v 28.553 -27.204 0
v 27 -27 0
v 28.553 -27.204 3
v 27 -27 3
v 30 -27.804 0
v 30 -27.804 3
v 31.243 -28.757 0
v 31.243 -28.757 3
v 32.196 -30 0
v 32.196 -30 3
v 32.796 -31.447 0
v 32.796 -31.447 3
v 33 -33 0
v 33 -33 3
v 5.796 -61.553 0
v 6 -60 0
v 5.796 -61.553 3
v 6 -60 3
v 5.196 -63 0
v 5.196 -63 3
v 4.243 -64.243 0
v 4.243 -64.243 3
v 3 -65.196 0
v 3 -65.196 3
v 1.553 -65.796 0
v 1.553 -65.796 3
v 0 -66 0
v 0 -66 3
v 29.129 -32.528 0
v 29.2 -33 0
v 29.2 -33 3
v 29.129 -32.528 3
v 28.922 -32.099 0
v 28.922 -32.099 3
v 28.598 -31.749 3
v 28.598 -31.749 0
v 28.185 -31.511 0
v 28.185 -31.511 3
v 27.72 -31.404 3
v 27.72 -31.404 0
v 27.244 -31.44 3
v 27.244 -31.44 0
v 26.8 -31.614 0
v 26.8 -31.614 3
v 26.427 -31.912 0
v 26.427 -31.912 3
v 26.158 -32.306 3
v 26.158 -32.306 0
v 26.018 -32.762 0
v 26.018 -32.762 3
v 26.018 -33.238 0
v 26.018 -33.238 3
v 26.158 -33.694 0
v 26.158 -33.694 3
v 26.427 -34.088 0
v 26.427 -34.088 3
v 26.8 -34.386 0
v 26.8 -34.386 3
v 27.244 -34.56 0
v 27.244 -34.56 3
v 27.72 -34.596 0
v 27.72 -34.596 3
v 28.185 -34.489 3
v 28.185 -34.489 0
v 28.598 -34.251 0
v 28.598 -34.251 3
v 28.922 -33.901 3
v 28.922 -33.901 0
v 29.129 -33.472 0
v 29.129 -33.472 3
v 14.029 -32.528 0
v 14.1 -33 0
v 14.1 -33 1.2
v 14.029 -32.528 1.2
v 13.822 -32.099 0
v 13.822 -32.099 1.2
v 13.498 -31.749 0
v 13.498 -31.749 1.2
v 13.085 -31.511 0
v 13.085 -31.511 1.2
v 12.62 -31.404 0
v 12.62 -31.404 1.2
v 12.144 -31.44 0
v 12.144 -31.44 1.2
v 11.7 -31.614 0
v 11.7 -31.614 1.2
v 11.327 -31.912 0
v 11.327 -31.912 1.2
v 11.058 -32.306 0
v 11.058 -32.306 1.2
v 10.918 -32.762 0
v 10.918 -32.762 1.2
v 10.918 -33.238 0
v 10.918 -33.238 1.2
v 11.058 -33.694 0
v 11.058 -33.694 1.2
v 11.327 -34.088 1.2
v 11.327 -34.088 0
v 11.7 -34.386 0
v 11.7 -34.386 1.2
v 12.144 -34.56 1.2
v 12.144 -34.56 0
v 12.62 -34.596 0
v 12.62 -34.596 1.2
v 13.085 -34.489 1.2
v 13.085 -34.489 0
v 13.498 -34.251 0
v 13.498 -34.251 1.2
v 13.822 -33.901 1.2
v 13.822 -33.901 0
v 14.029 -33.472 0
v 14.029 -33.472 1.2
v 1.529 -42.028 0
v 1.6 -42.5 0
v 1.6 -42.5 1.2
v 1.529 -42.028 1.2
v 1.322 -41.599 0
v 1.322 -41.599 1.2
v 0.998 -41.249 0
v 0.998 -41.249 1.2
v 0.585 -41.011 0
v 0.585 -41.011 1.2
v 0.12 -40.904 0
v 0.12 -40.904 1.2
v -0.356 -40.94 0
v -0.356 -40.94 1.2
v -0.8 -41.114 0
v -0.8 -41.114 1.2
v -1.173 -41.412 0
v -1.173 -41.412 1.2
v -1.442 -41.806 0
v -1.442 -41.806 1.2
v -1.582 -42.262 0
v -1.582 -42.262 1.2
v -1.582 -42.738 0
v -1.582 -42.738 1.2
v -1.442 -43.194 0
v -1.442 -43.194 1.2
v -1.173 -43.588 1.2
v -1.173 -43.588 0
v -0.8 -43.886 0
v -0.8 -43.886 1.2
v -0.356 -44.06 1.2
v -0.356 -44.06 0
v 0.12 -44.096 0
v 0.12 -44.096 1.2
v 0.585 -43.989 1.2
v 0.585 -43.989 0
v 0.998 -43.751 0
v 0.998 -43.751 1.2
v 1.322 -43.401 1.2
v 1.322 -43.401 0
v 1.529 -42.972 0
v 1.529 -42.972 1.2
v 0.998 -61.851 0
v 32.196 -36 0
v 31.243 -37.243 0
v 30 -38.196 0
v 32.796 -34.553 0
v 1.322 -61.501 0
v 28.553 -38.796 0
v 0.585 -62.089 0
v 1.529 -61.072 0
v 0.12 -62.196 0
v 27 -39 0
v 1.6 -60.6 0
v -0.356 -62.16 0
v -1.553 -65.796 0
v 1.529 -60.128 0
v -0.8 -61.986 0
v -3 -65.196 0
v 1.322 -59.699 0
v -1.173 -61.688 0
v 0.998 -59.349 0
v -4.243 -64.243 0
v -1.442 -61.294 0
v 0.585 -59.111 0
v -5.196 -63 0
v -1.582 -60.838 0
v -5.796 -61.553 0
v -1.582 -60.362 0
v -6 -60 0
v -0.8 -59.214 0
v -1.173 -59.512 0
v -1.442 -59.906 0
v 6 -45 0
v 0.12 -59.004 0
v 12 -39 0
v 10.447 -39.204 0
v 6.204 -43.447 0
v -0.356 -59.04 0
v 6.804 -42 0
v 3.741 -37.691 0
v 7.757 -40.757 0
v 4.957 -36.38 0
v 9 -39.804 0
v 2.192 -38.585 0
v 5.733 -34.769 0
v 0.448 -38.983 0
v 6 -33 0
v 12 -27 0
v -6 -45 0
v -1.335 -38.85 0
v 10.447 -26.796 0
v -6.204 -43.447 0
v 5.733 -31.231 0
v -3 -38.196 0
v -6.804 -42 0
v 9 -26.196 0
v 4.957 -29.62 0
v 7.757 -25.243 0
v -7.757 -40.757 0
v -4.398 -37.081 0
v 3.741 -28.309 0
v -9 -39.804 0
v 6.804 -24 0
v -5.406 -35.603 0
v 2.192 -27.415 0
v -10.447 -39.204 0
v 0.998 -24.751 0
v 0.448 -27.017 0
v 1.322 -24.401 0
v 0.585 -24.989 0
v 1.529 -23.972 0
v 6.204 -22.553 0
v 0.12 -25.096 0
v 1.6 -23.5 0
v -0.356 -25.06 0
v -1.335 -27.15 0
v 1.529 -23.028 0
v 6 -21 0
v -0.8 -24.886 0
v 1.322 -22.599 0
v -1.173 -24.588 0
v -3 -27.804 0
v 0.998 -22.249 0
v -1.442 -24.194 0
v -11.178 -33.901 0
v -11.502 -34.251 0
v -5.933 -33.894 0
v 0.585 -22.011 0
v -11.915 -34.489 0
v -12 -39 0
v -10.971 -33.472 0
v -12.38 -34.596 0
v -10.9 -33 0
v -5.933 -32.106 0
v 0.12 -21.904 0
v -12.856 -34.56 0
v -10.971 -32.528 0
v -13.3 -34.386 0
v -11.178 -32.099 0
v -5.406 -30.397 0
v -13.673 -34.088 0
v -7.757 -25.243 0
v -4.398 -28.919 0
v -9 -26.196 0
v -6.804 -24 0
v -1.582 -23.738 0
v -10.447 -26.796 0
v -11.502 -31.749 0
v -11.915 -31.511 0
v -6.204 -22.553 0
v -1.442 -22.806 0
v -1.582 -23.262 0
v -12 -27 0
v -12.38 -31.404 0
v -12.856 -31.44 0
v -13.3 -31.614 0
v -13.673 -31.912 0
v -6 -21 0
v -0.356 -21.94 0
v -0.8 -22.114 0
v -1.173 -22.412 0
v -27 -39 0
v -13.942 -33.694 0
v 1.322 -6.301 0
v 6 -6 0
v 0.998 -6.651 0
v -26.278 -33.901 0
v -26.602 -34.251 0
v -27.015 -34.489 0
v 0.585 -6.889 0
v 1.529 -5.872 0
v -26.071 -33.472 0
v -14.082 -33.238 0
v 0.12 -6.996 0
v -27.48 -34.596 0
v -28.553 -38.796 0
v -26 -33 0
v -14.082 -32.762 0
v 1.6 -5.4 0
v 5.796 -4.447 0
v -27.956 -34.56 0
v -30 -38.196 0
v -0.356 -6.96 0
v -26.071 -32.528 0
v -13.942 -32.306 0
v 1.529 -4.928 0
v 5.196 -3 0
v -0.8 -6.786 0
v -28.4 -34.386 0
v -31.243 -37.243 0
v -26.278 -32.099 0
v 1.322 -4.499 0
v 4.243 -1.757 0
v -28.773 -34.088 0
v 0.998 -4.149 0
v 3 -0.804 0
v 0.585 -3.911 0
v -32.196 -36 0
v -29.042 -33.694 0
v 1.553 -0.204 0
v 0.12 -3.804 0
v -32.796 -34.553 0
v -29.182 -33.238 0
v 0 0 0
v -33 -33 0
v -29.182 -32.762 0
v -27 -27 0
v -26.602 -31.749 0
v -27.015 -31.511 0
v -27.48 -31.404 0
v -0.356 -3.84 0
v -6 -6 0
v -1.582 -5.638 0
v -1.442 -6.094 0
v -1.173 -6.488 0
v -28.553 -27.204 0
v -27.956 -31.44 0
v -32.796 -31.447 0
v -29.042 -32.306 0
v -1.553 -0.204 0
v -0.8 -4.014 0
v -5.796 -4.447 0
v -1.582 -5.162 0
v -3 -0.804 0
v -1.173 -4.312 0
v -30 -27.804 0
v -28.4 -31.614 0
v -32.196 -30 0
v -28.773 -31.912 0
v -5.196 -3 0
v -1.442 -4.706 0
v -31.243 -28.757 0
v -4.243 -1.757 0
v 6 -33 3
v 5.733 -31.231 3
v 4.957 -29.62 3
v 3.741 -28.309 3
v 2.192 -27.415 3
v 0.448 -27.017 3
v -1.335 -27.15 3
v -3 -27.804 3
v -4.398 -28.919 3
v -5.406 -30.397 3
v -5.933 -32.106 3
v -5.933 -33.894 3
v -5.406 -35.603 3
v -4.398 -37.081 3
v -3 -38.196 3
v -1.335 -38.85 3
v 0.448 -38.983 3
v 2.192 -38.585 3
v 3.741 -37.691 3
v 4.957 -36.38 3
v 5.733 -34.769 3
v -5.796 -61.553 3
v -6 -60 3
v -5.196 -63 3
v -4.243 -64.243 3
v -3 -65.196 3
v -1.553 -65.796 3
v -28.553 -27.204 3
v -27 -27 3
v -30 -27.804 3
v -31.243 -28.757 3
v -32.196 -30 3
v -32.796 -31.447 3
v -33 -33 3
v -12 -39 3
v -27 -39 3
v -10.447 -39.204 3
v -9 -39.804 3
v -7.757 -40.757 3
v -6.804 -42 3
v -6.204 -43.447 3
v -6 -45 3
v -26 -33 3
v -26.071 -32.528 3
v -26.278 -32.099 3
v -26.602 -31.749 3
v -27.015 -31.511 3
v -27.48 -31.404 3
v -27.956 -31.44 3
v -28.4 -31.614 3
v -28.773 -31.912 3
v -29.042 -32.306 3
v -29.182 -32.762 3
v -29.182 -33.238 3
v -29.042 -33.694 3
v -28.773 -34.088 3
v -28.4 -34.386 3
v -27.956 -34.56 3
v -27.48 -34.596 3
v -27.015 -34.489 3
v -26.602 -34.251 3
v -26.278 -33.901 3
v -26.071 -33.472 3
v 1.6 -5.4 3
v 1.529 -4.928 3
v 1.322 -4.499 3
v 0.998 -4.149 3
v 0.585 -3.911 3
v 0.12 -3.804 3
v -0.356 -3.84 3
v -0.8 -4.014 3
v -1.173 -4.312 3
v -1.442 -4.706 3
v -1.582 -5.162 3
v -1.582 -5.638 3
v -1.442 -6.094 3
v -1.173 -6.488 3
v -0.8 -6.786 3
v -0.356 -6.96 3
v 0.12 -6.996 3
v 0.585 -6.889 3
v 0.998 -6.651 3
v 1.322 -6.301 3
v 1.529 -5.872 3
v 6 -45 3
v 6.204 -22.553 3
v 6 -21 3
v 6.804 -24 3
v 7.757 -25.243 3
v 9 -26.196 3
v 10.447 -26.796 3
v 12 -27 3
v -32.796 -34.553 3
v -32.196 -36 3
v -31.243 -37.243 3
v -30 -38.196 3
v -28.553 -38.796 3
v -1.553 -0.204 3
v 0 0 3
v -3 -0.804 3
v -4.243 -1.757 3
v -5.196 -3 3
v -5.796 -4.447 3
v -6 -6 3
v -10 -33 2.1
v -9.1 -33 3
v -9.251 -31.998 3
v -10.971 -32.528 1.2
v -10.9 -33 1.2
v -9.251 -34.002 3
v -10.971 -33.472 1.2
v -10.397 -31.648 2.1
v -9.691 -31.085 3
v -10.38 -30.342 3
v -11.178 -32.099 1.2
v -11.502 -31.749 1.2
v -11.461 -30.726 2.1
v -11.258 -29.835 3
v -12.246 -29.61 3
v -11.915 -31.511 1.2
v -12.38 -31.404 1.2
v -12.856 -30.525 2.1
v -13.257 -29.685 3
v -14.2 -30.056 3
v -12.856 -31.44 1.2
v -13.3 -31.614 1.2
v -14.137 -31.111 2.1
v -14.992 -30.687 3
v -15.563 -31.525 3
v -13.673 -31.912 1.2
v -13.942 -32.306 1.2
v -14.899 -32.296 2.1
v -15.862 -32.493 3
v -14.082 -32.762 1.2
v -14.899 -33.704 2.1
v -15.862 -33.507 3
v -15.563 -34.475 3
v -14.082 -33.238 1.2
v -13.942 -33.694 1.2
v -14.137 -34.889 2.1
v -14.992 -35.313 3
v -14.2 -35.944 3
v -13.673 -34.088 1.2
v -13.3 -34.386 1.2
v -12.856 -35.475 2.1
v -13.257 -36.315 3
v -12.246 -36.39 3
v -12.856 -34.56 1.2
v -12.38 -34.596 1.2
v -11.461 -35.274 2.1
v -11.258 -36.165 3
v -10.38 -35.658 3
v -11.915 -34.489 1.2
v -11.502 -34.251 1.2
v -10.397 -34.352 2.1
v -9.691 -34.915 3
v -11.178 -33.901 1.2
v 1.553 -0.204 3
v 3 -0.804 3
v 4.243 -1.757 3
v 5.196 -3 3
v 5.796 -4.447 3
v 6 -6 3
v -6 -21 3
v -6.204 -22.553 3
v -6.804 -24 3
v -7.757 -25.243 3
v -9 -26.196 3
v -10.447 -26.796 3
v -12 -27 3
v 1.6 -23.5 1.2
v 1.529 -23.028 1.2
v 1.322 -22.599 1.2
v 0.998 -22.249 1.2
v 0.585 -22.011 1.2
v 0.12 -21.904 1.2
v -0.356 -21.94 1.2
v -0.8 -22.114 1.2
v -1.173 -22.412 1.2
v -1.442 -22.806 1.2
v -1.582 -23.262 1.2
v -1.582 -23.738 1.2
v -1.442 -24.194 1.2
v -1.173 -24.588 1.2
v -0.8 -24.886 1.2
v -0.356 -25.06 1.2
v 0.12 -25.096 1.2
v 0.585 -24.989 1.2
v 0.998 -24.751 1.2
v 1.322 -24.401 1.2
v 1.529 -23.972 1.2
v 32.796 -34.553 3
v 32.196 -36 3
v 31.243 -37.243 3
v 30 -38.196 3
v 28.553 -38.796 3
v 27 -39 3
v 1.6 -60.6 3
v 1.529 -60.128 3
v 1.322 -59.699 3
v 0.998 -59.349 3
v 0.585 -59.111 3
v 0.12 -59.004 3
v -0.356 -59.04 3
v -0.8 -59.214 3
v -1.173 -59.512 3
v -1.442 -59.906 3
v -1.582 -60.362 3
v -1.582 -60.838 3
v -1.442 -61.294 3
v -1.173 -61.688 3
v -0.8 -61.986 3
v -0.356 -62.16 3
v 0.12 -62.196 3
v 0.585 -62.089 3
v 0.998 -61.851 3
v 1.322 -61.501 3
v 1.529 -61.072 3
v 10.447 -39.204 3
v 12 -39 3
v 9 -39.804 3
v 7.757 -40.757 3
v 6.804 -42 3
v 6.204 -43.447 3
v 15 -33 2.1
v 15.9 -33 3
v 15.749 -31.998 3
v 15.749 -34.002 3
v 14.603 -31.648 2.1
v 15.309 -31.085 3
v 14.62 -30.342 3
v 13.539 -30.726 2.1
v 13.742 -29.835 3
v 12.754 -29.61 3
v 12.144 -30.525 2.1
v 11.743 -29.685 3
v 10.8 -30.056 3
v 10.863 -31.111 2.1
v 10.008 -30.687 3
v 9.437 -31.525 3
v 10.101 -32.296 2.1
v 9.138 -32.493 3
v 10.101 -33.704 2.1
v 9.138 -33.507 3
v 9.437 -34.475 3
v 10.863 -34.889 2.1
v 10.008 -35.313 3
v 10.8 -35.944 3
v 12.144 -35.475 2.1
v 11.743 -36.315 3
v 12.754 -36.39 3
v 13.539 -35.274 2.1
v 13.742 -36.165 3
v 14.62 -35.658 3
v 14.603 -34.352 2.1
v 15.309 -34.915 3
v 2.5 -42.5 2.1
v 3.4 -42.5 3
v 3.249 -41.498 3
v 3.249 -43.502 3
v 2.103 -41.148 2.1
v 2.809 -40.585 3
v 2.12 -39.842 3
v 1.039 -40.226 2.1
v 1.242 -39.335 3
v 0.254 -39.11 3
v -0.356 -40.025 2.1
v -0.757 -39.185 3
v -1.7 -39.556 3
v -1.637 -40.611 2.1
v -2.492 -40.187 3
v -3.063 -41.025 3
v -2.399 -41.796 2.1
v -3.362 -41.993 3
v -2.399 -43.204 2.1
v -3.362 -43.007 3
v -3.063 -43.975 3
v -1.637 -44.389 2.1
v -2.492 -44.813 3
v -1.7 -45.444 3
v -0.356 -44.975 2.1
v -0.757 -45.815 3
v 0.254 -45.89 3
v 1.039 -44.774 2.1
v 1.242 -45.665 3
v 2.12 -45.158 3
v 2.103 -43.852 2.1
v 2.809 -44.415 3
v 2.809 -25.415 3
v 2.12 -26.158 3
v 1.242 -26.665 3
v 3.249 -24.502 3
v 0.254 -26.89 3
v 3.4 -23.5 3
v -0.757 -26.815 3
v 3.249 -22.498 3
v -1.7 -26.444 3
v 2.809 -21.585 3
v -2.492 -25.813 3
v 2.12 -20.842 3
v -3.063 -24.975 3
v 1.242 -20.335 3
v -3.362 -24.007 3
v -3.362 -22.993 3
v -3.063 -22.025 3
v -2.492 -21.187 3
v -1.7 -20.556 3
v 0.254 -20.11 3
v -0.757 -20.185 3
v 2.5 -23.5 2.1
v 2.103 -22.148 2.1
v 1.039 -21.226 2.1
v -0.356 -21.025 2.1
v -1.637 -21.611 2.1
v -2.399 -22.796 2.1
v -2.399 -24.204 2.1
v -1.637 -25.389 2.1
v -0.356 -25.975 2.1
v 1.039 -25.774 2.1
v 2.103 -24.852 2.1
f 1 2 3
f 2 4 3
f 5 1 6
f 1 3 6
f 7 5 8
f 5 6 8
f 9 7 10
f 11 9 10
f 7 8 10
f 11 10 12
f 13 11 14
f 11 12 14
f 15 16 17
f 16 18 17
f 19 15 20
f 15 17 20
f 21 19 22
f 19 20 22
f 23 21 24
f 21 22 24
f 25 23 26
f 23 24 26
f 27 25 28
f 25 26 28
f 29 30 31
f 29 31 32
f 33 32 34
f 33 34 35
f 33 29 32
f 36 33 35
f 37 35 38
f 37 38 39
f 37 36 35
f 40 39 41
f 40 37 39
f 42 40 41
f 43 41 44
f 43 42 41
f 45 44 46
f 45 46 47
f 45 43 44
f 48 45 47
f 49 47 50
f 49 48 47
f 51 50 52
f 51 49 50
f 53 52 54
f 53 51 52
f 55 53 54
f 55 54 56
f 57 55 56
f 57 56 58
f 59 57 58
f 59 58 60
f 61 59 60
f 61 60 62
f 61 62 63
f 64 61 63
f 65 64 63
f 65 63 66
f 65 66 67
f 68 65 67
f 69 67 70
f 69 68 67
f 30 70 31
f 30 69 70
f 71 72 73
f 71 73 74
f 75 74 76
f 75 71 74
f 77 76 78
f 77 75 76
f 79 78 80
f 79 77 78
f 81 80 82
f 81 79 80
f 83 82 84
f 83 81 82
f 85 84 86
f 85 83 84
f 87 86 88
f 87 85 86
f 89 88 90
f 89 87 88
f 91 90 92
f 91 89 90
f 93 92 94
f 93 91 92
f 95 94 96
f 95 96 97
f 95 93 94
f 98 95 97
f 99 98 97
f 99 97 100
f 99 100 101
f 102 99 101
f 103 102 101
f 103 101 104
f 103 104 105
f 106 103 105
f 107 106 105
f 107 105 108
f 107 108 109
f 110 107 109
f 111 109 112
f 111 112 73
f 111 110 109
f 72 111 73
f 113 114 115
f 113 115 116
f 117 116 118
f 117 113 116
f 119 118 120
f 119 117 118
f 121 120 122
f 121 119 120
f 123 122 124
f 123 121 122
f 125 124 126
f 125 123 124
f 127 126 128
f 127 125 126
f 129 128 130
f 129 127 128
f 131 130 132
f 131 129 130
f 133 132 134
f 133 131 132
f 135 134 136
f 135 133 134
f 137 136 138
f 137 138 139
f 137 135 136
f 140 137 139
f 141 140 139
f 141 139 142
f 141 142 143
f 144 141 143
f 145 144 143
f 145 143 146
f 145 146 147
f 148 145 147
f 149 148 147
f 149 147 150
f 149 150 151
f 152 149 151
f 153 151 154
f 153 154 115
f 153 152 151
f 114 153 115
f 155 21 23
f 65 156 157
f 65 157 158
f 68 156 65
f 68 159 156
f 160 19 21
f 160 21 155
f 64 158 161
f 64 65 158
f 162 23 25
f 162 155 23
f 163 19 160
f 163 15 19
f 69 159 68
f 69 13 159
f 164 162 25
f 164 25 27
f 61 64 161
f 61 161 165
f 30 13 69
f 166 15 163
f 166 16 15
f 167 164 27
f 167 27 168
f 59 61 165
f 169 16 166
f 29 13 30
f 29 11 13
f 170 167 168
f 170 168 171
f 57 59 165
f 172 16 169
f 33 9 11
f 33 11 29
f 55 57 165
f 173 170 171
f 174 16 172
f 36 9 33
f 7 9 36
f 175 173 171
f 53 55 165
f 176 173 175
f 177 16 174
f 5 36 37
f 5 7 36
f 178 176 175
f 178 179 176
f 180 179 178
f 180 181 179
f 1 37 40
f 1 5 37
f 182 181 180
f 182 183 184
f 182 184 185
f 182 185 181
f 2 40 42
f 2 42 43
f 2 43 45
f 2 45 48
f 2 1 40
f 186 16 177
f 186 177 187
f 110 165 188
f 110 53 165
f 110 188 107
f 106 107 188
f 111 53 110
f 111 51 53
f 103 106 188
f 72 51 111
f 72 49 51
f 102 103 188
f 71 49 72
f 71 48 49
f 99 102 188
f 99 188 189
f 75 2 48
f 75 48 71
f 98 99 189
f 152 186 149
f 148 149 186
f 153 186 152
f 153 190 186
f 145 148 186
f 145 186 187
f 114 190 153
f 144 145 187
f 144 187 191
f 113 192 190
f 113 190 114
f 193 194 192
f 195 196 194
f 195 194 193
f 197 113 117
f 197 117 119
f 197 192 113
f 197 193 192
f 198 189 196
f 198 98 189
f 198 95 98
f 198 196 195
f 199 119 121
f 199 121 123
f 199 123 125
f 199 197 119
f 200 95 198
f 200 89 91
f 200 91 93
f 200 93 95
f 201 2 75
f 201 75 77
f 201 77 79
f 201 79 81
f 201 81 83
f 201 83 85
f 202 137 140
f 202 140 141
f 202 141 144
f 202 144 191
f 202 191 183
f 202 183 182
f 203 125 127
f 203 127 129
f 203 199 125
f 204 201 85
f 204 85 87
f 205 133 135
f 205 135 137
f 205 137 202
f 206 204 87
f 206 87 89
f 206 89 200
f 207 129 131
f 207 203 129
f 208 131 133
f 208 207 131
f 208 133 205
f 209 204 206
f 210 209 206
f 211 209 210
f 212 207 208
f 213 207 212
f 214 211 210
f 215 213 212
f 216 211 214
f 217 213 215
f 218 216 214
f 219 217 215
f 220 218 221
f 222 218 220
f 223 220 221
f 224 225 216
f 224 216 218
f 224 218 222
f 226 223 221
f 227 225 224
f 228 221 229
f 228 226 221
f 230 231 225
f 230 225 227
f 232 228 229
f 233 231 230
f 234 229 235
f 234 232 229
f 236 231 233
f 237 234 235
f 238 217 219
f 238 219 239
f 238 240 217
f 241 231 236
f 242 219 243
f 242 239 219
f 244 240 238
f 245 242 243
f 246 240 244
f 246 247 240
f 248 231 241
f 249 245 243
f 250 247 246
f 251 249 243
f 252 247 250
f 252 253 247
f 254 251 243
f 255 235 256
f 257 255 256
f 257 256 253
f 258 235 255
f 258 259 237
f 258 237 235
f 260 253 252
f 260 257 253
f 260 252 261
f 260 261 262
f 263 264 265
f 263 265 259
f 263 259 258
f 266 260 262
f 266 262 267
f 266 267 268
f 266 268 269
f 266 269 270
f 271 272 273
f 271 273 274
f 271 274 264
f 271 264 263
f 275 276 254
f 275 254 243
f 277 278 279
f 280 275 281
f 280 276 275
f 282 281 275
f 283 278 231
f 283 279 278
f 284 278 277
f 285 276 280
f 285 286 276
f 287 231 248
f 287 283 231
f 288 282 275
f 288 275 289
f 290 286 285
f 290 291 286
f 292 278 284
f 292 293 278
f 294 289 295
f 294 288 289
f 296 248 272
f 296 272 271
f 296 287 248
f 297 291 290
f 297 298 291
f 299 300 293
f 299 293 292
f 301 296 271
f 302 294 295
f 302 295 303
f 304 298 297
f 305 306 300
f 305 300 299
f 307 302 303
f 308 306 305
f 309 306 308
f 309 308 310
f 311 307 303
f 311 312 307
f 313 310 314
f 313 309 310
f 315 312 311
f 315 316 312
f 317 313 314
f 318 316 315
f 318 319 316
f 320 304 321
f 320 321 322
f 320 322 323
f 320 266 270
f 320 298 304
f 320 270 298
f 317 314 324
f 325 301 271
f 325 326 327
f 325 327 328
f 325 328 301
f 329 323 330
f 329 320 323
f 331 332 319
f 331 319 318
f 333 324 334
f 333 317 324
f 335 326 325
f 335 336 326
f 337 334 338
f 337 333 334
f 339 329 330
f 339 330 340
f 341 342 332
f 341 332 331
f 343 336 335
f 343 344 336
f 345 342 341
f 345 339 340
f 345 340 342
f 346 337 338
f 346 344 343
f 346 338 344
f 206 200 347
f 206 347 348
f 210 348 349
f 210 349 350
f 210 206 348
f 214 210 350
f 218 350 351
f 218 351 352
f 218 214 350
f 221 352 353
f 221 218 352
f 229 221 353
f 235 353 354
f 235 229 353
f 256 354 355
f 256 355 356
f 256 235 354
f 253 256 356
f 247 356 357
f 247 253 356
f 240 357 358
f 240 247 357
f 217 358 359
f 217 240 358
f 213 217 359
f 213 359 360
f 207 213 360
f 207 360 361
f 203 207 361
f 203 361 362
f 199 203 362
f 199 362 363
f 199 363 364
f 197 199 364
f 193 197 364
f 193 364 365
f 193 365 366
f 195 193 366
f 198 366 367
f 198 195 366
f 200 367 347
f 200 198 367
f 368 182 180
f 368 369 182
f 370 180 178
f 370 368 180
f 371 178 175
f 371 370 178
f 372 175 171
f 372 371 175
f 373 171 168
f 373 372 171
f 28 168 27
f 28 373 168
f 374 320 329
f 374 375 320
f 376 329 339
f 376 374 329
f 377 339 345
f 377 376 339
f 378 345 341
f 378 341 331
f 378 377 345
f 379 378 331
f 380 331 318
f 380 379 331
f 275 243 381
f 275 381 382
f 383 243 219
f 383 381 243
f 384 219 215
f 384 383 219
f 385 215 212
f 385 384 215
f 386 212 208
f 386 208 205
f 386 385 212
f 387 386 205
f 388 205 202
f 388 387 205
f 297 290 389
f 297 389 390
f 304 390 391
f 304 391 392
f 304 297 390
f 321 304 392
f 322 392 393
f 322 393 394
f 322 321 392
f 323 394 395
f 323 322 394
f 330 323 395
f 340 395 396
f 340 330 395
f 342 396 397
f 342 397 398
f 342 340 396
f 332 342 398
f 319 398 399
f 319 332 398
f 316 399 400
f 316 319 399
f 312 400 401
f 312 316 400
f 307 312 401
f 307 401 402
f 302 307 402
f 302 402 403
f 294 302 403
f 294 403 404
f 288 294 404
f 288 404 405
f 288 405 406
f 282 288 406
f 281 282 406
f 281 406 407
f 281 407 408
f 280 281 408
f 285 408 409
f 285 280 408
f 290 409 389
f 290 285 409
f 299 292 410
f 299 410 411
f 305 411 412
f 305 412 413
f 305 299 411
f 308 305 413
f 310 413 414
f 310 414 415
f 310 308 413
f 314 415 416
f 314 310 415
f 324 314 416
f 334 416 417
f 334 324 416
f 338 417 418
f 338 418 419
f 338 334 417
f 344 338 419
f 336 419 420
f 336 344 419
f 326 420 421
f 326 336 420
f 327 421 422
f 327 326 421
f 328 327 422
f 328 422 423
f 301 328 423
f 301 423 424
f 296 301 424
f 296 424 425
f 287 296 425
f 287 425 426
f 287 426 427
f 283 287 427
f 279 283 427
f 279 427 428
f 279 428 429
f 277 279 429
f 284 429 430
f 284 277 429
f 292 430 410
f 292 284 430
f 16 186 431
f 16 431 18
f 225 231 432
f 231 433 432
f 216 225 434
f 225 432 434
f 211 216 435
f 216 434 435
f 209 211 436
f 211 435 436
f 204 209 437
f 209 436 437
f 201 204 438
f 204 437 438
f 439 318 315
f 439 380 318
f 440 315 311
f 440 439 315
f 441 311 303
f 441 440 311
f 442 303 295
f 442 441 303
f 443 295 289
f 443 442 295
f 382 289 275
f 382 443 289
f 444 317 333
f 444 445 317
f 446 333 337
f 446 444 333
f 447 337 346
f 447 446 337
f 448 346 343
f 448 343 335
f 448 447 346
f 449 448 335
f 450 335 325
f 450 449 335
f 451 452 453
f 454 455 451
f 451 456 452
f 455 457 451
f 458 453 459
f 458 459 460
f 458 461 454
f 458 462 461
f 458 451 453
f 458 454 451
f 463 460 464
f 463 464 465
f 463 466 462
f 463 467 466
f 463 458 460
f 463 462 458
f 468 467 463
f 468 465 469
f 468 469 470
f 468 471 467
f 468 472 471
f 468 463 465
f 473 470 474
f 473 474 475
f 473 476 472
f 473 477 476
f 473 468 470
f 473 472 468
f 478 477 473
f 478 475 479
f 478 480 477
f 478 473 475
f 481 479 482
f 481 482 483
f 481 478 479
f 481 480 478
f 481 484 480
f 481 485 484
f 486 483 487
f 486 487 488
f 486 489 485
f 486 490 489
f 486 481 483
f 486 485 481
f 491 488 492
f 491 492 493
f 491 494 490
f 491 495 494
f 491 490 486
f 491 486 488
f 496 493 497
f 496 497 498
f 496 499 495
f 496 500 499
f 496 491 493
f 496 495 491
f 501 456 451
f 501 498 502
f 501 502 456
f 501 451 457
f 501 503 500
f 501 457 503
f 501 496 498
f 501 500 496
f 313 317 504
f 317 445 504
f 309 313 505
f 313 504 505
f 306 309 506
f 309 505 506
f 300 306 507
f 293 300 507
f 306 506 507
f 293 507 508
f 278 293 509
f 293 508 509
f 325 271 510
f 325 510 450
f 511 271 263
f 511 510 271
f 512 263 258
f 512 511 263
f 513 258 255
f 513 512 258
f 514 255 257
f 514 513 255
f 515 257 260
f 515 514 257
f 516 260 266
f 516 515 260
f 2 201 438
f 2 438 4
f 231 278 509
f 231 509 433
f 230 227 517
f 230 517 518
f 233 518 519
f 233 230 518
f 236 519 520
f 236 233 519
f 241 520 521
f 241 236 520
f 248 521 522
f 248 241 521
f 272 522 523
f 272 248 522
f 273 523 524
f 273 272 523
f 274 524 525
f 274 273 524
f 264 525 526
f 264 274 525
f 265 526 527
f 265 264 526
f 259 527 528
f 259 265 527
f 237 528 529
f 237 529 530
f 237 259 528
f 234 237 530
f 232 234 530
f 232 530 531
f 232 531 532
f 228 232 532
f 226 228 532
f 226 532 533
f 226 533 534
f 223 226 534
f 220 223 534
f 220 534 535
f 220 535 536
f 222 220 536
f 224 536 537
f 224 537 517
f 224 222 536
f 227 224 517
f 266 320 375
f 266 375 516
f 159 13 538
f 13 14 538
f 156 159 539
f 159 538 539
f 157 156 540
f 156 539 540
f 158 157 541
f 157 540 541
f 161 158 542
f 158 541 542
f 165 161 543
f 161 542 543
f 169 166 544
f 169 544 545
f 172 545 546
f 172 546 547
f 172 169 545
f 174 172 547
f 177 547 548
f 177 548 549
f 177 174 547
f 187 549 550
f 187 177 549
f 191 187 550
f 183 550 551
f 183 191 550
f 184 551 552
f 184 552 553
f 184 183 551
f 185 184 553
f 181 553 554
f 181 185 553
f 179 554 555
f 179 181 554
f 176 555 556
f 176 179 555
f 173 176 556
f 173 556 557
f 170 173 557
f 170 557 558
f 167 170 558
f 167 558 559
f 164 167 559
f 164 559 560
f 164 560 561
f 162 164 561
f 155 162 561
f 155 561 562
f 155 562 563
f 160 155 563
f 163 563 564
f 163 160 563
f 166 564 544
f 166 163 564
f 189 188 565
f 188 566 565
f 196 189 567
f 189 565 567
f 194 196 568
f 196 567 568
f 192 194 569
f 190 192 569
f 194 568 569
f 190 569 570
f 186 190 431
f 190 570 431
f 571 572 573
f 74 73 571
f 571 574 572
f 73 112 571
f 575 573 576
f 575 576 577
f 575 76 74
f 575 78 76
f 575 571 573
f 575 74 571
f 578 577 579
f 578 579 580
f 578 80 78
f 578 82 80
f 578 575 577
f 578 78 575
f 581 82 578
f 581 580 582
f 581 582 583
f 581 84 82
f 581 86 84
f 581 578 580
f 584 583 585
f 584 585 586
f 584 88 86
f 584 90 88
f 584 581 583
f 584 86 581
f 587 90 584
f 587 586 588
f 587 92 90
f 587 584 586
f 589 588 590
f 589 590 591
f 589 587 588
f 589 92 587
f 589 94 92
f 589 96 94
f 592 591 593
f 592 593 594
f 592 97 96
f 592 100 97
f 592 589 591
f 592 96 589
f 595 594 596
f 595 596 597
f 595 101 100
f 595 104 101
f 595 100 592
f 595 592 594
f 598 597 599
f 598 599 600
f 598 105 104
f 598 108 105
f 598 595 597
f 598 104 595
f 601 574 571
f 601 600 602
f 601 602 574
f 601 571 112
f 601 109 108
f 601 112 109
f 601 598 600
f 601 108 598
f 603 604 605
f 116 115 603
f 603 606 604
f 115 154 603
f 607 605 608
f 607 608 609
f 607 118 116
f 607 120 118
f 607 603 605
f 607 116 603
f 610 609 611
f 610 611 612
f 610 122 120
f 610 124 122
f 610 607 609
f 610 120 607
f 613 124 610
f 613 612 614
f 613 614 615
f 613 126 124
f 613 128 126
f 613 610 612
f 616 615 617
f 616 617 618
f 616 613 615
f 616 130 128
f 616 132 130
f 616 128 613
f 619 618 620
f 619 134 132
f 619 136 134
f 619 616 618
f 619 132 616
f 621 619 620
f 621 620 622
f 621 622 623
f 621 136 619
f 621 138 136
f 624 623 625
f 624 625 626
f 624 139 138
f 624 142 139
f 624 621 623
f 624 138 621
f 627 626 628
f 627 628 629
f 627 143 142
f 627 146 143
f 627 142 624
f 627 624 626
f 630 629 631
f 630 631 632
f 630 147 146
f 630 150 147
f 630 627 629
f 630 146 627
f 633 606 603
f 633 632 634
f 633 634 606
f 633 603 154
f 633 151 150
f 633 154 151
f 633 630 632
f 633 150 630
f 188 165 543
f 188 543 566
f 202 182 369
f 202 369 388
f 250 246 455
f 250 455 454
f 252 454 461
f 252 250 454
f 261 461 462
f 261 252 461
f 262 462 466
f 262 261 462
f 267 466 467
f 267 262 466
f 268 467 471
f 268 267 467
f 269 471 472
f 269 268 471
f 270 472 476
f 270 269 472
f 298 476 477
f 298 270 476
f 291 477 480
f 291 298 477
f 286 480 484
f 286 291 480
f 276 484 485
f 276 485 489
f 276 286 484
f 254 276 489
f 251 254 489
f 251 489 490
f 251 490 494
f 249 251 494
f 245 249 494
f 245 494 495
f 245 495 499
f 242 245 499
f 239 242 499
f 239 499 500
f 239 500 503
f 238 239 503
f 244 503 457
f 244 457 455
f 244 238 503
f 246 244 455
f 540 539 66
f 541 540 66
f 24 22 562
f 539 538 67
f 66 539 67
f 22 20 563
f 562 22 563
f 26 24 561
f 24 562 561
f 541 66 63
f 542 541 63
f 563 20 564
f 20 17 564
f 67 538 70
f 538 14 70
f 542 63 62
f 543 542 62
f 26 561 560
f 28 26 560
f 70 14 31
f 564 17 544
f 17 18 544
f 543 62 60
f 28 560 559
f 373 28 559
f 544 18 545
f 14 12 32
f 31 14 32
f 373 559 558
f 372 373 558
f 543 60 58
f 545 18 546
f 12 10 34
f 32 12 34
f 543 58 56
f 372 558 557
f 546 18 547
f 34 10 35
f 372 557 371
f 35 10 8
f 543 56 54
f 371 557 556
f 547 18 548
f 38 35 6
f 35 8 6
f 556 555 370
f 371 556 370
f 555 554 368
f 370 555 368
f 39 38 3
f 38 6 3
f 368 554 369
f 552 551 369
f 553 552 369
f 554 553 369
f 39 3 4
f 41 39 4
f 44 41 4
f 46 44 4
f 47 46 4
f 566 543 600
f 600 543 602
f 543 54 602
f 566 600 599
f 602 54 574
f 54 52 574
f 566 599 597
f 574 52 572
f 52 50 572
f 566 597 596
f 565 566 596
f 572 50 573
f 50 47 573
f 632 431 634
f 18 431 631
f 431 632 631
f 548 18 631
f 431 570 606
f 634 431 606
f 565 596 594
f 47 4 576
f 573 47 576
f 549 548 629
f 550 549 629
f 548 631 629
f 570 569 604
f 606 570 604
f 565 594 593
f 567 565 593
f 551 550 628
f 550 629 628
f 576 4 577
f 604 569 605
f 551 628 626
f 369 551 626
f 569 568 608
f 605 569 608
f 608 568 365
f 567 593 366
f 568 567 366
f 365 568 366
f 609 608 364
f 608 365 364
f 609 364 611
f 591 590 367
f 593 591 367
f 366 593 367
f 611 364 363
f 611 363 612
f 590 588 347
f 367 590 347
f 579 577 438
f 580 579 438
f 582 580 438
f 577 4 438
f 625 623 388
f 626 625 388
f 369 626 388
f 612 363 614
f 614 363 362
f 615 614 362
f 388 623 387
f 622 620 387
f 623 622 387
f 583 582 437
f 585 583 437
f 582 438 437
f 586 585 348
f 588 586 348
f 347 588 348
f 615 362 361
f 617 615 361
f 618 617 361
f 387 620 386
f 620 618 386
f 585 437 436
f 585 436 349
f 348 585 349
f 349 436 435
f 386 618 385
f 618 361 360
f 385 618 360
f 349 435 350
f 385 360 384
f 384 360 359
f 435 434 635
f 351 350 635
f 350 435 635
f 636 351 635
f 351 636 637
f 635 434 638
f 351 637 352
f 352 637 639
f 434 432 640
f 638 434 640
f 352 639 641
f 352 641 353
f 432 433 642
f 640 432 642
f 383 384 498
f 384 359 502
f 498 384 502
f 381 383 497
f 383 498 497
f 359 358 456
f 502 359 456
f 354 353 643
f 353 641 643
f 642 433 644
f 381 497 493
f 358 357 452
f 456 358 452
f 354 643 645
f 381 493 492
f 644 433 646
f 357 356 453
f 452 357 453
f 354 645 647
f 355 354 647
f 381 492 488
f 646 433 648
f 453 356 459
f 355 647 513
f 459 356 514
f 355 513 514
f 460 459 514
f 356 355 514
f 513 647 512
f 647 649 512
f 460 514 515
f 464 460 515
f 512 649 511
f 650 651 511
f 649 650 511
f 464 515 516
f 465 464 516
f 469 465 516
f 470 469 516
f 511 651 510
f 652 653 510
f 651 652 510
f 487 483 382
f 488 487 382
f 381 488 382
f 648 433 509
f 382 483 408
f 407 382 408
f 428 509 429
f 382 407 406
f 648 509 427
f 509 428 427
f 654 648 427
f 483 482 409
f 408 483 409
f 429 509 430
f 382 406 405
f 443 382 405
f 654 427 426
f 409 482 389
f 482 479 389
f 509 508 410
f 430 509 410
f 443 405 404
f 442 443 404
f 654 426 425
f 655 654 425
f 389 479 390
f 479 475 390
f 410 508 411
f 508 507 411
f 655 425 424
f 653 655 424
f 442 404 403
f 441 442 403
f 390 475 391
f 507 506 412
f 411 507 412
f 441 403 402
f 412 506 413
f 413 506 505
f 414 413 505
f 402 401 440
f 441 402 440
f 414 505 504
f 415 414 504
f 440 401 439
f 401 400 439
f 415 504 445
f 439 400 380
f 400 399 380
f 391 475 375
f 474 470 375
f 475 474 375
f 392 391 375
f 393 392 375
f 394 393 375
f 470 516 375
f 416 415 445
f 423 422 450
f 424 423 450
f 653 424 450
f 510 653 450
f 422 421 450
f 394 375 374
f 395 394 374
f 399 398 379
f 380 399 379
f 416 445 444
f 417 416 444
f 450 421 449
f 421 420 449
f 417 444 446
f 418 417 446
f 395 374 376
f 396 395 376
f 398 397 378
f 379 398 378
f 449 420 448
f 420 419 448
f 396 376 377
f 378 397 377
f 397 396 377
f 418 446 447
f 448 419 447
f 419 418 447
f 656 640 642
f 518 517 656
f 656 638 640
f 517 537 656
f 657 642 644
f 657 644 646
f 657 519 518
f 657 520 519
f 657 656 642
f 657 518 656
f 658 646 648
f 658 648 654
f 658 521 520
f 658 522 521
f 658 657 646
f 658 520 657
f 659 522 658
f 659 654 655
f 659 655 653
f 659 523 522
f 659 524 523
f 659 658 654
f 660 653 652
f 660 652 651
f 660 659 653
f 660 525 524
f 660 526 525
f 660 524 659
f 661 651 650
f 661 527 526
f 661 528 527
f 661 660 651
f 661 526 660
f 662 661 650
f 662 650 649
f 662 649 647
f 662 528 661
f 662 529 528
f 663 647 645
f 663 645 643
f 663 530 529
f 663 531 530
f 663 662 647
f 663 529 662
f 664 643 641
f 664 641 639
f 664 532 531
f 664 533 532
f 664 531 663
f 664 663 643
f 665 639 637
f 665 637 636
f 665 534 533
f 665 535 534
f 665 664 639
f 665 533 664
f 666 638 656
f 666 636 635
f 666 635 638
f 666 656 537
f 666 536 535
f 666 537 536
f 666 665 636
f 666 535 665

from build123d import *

# Parameters (mm, degrees)
SKETCH_1_R      = 1.6
SKETCH_1_R_2    = 6
EXTRUDE_1_DEPTH = 3
FILLET_1_R      = 6
CHAMFER_1_SIZE  = 1.8


with BuildPart() as part:
    # 草图1 → 凸台-拉伸1 (new body)
    with BuildSketch(Plane.XY):
        Polygon((-6, 0), (6, 0), (6, -27), (33, -27), (33, -39), (6, -39), (6, -66), (-6, -66), (-6, -39), (-33, -39), (-33, -27), (-6, -27), align=None)
        with Locations((0, -5.4)):
            Circle(SKETCH_1_R, mode=Mode.SUBTRACT)
        with Locations((-27.6, -33)):
            Circle(SKETCH_1_R, mode=Mode.SUBTRACT)
        with Locations((27.6, -33)):
            Circle(SKETCH_1_R, mode=Mode.SUBTRACT)
        with Locations((0, -60.6)):
            Circle(SKETCH_1_R, mode=Mode.SUBTRACT)
        with Locations((0, -23.5)):
            Circle(SKETCH_1_R, mode=Mode.SUBTRACT)
        with Locations((12.5, -33)):
            Circle(SKETCH_1_R, mode=Mode.SUBTRACT)
        with Locations((0, -42.5)):
            Circle(SKETCH_1_R, mode=Mode.SUBTRACT)
        with Locations((-12.5, -33)):
            Circle(SKETCH_1_R, mode=Mode.SUBTRACT)
        with Locations((0, -33)):
            Circle(SKETCH_1_R_2, mode=Mode.SUBTRACT)
    extrude(amount=EXTRUDE_1_DEPTH)

    # 圆角1
    fillet_1_edges = [part.edges().sort_by_distance(p)[0] for p in [
        (-6, -39, 1.5),
        (-6, -66, 1.5),
        (6, -66, 1.5),
        (6, -39, 1.5),
        (33, -39, 1.5),
        (33, -27, 1.5),
        (-6, 0, 1.5),
        (6, 0, 1.5),
        (6, -27, 1.5),
        (-6, -27, 1.5),
        (-33, -39, 1.5),
        (-33, -27, 1.5),
    ]]
    fillet(fillet_1_edges, radius=FILLET_1_R - 0.0001)  # a hair under: the kernel refuses the full size

    # 倒角1
    chamfer_1_edges = [part.edges().sort_by_distance(p)[0] for p in [
        (-1.6, -23.5, 3),
        (10.9, -33, 3),
        (-1.6, -42.5, 3),
        (-14.1, -33, 3),
    ]]
    chamfer(chamfer_1_edges, length=CHAMFER_1_SIZE)


solid = part.part
